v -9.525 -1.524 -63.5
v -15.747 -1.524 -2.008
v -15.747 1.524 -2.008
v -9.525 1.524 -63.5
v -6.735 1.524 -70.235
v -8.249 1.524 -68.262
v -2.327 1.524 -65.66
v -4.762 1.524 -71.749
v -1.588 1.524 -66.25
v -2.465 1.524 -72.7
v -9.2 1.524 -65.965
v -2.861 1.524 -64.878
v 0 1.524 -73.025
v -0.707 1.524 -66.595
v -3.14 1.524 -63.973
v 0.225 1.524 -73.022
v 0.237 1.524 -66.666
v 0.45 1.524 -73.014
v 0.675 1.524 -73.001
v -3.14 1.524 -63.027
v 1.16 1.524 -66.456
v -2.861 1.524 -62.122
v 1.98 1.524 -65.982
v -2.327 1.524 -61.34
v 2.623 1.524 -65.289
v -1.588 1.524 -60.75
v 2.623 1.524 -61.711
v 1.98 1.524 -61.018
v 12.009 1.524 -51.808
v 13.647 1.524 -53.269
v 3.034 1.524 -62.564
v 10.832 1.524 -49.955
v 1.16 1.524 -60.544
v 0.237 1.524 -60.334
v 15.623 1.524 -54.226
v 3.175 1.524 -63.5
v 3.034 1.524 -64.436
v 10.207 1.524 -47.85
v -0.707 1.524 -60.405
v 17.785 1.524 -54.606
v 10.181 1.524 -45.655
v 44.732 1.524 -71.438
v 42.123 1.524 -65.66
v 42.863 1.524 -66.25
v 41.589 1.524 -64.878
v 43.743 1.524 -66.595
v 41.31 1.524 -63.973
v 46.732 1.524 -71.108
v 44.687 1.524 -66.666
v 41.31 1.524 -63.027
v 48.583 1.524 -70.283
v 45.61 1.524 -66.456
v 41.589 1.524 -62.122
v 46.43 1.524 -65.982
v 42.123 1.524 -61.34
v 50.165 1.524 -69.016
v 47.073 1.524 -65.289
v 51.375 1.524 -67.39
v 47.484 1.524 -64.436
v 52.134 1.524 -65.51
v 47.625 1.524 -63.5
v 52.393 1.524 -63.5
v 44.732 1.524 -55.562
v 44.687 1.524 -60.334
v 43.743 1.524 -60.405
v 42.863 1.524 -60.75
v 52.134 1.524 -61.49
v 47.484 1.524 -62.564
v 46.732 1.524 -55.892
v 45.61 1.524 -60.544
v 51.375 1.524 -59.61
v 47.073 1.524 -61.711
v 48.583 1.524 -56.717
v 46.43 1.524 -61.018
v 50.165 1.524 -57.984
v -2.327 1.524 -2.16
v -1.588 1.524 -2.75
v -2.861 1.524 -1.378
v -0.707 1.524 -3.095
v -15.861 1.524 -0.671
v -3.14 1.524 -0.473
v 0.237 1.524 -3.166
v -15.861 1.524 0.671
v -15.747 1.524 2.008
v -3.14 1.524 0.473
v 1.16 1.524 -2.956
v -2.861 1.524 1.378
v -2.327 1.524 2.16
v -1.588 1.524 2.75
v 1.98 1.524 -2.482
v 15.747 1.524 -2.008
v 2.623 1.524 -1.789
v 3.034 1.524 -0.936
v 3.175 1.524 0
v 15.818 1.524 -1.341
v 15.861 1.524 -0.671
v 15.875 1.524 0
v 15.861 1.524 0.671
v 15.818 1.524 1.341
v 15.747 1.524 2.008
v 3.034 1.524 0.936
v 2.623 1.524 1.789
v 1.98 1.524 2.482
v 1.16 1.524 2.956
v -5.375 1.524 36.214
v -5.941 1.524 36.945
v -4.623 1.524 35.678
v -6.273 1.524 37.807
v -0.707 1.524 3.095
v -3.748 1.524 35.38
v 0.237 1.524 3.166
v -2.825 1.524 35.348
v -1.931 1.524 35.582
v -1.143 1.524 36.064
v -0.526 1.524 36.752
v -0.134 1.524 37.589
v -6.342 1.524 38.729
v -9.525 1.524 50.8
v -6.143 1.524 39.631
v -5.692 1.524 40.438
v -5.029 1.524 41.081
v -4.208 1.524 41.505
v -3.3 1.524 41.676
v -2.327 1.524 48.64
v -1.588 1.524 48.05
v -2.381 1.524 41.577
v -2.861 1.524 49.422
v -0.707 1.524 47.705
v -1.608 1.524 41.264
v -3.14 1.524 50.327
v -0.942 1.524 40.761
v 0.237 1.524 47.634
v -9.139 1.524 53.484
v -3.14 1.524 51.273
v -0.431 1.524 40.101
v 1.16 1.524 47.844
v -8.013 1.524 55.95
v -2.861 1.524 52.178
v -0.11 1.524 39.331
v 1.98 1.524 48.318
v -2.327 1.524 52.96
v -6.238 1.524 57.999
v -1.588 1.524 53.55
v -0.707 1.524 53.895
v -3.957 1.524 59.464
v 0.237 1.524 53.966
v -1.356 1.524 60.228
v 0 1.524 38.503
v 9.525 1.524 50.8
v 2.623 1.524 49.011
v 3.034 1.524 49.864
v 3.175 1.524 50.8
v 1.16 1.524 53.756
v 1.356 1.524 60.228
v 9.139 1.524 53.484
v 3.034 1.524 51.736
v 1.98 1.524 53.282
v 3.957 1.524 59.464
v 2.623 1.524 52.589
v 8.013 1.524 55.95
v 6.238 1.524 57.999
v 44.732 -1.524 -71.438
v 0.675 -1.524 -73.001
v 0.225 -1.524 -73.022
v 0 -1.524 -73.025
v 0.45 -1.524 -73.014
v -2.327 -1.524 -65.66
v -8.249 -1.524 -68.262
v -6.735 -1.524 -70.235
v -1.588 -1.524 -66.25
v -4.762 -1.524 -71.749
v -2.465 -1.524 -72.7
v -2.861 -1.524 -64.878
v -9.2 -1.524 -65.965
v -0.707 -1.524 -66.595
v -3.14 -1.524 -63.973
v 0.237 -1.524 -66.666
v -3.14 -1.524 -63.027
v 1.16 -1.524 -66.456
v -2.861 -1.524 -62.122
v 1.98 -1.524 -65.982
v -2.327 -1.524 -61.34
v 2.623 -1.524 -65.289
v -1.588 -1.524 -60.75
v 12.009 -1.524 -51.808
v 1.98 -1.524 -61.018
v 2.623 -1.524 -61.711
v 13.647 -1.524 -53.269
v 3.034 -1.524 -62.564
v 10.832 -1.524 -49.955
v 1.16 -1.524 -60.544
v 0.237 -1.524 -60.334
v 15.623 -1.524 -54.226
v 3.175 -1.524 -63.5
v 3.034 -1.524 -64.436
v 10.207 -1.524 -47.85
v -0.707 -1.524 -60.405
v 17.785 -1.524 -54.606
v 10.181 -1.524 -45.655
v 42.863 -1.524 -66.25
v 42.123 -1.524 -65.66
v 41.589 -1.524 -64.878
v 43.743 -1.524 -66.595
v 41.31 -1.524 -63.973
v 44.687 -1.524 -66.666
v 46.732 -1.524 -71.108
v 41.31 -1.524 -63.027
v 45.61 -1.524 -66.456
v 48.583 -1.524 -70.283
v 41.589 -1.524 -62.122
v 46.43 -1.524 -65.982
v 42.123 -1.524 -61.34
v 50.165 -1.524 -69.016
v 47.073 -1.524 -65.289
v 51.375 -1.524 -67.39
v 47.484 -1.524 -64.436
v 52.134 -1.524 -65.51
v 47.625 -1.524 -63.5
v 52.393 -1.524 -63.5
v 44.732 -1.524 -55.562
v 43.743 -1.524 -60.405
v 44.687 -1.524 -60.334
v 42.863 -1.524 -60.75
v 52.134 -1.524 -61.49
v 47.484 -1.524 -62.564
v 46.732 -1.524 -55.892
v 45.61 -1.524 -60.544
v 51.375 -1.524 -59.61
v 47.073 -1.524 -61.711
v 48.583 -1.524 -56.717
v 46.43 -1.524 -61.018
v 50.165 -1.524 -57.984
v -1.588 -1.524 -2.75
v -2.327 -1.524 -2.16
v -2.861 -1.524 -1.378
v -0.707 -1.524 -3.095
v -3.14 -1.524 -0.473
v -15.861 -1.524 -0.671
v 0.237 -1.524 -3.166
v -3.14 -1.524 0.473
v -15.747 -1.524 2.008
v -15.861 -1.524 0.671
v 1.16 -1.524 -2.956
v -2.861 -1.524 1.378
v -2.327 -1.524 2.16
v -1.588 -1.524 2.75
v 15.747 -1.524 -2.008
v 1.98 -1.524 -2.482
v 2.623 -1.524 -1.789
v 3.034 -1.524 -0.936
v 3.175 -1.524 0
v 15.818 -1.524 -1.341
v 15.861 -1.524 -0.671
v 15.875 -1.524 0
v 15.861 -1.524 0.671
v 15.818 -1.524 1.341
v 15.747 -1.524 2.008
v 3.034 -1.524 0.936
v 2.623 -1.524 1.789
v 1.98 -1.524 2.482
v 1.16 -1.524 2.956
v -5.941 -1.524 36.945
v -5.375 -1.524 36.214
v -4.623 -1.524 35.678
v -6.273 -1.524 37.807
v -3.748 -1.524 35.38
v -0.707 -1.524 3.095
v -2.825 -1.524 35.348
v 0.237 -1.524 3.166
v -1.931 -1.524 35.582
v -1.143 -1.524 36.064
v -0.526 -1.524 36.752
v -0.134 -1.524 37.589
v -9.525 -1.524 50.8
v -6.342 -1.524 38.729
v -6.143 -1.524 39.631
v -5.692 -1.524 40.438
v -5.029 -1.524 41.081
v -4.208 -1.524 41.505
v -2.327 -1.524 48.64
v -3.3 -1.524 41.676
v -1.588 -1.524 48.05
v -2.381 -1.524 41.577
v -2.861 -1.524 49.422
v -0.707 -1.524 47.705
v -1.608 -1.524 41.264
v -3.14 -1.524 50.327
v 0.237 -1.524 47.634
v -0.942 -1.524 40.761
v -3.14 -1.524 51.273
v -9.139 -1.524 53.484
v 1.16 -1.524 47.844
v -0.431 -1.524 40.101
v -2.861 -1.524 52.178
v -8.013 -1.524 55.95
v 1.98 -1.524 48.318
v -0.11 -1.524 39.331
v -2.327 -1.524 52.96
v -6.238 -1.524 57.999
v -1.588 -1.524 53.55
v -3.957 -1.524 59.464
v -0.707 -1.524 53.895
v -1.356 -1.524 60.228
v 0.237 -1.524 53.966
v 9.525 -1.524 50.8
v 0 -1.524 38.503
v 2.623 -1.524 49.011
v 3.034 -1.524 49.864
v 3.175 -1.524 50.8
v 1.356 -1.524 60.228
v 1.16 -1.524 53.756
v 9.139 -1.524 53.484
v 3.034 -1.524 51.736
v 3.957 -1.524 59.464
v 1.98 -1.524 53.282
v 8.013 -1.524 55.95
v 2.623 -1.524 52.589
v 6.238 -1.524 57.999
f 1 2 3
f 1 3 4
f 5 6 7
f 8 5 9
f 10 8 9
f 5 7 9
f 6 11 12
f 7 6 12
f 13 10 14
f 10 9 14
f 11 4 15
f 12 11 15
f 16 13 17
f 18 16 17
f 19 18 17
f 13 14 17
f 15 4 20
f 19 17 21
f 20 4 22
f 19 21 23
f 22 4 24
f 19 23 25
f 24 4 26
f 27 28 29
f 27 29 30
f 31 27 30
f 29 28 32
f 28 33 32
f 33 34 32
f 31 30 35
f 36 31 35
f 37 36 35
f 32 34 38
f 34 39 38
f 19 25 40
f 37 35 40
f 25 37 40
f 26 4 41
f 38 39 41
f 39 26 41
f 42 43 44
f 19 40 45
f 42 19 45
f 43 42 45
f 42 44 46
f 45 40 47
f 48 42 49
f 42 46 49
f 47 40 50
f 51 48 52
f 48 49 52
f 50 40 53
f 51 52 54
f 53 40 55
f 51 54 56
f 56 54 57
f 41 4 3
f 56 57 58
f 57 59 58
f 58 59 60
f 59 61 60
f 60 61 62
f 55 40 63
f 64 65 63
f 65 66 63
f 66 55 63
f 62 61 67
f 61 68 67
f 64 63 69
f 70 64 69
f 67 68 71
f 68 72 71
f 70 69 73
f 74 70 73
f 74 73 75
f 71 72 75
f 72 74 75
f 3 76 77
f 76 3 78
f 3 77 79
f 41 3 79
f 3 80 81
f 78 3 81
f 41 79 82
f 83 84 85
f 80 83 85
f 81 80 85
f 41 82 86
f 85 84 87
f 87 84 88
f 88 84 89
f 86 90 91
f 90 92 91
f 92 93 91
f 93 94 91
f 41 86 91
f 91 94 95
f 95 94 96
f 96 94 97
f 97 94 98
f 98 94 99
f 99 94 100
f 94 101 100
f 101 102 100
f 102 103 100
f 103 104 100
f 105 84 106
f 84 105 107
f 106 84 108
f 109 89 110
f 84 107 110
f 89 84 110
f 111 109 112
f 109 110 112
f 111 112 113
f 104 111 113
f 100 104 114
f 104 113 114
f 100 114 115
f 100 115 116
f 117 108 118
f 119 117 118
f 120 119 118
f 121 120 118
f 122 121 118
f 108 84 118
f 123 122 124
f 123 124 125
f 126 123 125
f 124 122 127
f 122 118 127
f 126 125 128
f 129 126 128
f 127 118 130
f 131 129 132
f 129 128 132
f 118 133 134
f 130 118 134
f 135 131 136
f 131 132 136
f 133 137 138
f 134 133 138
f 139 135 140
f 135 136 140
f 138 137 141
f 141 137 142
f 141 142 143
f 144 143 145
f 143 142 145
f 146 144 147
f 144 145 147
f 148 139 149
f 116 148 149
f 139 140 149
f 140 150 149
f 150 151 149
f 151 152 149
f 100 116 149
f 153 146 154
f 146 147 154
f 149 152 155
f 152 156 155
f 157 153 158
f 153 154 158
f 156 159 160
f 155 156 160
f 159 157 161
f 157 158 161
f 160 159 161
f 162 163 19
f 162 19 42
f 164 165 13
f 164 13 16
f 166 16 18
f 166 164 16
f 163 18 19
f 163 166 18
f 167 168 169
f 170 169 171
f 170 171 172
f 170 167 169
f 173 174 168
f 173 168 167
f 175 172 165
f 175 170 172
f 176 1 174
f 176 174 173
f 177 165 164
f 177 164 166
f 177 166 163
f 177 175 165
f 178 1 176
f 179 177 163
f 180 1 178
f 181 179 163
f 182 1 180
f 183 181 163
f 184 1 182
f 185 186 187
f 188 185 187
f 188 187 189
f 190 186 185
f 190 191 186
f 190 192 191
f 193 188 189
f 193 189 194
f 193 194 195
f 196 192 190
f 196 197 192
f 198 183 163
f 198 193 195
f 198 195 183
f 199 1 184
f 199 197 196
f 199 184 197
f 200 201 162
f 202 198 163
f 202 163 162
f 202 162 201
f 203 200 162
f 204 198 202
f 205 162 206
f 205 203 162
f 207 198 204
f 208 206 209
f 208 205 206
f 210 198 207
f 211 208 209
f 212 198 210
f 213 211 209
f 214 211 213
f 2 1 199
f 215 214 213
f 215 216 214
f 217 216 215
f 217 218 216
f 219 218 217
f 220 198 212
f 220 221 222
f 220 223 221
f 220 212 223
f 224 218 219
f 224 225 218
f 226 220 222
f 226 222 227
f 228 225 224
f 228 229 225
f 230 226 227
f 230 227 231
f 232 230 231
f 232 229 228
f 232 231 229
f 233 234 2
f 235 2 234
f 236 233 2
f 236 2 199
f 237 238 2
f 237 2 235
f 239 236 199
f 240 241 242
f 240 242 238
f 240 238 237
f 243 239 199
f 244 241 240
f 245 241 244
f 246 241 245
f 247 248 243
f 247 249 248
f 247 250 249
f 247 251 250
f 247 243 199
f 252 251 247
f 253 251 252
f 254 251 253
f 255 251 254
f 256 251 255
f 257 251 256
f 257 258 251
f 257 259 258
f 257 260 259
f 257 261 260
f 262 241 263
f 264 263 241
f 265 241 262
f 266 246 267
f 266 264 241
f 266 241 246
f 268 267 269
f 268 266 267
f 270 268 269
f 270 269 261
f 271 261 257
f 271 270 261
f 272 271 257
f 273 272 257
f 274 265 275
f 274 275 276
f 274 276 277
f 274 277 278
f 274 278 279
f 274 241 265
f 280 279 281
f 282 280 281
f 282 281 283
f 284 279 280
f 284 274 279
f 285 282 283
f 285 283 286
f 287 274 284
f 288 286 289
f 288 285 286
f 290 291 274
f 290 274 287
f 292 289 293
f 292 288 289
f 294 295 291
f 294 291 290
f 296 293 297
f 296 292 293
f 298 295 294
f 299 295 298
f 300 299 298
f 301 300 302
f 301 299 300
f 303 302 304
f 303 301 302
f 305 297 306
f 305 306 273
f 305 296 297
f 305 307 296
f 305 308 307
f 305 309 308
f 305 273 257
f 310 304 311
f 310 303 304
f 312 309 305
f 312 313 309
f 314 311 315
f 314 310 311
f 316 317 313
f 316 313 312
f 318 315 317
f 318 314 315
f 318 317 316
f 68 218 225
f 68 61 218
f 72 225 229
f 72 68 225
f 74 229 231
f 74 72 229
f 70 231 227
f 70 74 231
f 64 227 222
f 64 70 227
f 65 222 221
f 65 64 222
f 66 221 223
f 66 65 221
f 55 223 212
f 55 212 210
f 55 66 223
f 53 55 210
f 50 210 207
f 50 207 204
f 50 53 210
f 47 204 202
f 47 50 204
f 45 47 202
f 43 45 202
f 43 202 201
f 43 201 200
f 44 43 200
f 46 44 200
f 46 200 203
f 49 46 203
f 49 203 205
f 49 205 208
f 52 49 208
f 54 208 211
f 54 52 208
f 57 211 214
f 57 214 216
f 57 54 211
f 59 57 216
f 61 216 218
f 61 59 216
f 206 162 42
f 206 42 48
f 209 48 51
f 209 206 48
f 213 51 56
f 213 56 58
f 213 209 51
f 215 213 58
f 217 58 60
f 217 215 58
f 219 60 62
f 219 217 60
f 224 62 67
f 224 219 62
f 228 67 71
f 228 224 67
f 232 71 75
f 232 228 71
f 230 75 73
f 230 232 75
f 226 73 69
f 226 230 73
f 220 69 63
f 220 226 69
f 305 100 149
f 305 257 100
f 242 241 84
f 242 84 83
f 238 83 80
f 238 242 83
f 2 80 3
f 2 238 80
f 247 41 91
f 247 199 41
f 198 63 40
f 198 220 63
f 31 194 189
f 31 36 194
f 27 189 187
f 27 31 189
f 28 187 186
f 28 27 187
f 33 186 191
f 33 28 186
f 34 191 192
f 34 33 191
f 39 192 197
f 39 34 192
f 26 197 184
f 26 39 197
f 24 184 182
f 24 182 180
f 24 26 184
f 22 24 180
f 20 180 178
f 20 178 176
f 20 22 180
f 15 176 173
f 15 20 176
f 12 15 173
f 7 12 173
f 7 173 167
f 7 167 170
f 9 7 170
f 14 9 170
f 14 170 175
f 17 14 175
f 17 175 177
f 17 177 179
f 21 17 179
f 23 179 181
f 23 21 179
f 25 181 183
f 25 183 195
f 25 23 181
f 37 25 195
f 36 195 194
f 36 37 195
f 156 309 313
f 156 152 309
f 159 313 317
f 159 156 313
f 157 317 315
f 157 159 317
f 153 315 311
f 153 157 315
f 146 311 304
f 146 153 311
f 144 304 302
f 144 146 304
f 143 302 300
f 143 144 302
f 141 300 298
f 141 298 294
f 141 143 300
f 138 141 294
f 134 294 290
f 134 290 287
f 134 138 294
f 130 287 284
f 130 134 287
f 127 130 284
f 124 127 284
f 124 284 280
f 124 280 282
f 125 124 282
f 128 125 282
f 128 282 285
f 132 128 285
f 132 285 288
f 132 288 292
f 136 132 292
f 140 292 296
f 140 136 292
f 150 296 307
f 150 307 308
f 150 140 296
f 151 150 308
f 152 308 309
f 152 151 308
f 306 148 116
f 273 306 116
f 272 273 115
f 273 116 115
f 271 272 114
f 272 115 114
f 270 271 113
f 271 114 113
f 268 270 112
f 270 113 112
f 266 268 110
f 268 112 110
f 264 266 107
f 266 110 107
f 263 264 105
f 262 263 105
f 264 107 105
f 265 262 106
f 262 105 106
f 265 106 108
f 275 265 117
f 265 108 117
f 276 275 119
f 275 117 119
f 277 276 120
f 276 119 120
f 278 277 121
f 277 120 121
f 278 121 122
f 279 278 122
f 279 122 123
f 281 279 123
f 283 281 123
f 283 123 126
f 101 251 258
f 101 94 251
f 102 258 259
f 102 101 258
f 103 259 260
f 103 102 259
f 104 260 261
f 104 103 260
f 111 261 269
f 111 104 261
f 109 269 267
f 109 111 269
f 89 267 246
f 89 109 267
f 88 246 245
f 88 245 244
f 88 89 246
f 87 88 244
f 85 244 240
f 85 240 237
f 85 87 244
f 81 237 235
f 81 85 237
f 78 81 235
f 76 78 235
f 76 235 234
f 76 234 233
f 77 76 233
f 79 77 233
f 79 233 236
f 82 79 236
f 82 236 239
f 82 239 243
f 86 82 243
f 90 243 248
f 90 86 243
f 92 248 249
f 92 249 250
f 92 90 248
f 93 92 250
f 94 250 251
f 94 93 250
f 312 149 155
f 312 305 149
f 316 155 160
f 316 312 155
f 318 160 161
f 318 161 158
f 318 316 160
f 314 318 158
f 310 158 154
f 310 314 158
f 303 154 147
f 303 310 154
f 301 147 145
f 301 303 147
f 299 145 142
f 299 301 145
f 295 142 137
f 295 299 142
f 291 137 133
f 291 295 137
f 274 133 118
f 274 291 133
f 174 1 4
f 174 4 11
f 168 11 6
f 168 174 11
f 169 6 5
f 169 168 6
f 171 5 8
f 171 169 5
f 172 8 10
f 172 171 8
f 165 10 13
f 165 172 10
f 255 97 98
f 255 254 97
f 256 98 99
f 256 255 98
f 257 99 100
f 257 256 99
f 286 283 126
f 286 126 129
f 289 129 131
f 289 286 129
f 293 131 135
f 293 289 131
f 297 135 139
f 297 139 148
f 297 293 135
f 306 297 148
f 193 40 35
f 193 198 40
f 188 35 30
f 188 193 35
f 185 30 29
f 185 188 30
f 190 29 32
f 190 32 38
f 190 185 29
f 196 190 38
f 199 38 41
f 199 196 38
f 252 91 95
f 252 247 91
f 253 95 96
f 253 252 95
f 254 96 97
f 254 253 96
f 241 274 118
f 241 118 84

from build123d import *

# Parameters (mm, degrees)
F0_R     = 3.175
F1_DEPTH = 1.524


with BuildPart() as f1:
    # F0 (on Front) → F1 (new body, symmetric)
    with BuildSketch(Plane.XZ):
        with BuildLine():
            ThreePointArc((-2.38125, 41.577458), (5.832848, 43.269826), (9.525, 50.8))
            ThreePointArc((9.525, 50.8), (0, 60.325), (-9.525, 50.8))
            ThreePointArc((-9.525, 50.8), (-7.530174, 44.967152), (-2.38125, 41.577458))
        make_face()
        with Locations((0, 50.8)):
            Circle(F0_R, mode=Mode.SUBTRACT)
        with BuildLine():
            Line((15.747457, 2.008289), (9.525, 50.8))
            ThreePointArc((9.525, 50.8), (5.832848, 43.269826), (-2.38125, 41.577458))
            ThreePointArc((-2.38125, 41.577458), (-7.530174, 44.967152), (-9.525, 50.8))
            Line((-9.525, 50.8), (-15.747457, 2.008289))
            ThreePointArc((-15.747457, 2.008289), (0, 15.875), (15.747457, 2.008289))
        make_face()
        with BuildLine():
            ThreePointArc((0, 38.503278), (-5.685058, 36.558995), (-2.38125, 41.577458))
            ThreePointArc((-2.38125, 41.577458), (-0.664942, 40.44756), (0, 38.503278))
        make_face(mode=Mode.SUBTRACT)
        with BuildLine():
            ThreePointArc((15.875, 0), (15.843082, 1.006168), (15.747457, 2.008289))
            ThreePointArc((15.747457, 2.008289), (0, 15.875), (-15.747457, 2.008289))
            ThreePointArc((-15.747457, 2.008289), (-15.875, 0), (-15.747457, -2.008289))
            ThreePointArc((-15.747457, -2.008289), (0, -15.875), (15.747457, -2.008289))
            ThreePointArc((15.747457, -2.008289), (15.843082, -1.006168), (15.875, 0))
        make_face()
        Circle(F0_R, mode=Mode.SUBTRACT)
        with BuildLine():
            ThreePointArc((15.747457, -2.008289), (0, -15.875), (-15.747457, -2.008289))
            Line((-15.747457, -2.008289), (-9.525, -63.5))
            ThreePointArc((-9.525, -63.5), (0, -53.975), (9.525, -63.5))
            ThreePointArc((9.525, -63.5), (6.96982, -69.99209), (0.675187, -73.001039))
            Line((0.675187, -73.001039), (44.731685, -71.437583))
            ThreePointArc((44.731685, -71.437583), (36.50742, -63.5), (44.731685, -55.562417))
            Line((44.731685, -55.562417), (17.785491, -54.606163))
            ThreePointArc((17.785491, -54.606163), (12.008562, -51.808352), (10.18112, -45.655213))
            Line((10.18112, -45.655213), (15.747457, -2.008289))
        make_face()
        with BuildLine():
            ThreePointArc((9.525, -63.5), (0, -53.975), (-9.525, -63.5))
            ThreePointArc((-9.525, -63.5), (-6.735192, -70.235192), (0, -73.025))
            Line((0, -73.025), (0.675187, -73.001039))
            ThreePointArc((0.675187, -73.001039), (6.96982, -69.99209), (9.525, -63.5))
        make_face()
        with Locations((0, -63.5)):
            Circle(F0_R, mode=Mode.SUBTRACT)
        with BuildLine():
            Line((0.675187, -73.001039), (0, -73.025))
            ThreePointArc((0, -73.025), (0.337806, -73.019008), (0.675187, -73.001039))
        make_face()
        with BuildLine():
            ThreePointArc((52.39258, -63.5), (50.164975, -57.984238), (44.731685, -55.562417))
            ThreePointArc((44.731685, -55.562417), (36.50742, -63.5), (44.731685, -71.437583))
            ThreePointArc((44.731685, -71.437583), (50.164975, -69.015762), (52.39258, -63.5))
        make_face()
        with Locations((44.45, -63.5)):
            Circle(F0_R, mode=Mode.SUBTRACT)
    extrude(amount=F1_DEPTH, both=True)


solid = f1.part
